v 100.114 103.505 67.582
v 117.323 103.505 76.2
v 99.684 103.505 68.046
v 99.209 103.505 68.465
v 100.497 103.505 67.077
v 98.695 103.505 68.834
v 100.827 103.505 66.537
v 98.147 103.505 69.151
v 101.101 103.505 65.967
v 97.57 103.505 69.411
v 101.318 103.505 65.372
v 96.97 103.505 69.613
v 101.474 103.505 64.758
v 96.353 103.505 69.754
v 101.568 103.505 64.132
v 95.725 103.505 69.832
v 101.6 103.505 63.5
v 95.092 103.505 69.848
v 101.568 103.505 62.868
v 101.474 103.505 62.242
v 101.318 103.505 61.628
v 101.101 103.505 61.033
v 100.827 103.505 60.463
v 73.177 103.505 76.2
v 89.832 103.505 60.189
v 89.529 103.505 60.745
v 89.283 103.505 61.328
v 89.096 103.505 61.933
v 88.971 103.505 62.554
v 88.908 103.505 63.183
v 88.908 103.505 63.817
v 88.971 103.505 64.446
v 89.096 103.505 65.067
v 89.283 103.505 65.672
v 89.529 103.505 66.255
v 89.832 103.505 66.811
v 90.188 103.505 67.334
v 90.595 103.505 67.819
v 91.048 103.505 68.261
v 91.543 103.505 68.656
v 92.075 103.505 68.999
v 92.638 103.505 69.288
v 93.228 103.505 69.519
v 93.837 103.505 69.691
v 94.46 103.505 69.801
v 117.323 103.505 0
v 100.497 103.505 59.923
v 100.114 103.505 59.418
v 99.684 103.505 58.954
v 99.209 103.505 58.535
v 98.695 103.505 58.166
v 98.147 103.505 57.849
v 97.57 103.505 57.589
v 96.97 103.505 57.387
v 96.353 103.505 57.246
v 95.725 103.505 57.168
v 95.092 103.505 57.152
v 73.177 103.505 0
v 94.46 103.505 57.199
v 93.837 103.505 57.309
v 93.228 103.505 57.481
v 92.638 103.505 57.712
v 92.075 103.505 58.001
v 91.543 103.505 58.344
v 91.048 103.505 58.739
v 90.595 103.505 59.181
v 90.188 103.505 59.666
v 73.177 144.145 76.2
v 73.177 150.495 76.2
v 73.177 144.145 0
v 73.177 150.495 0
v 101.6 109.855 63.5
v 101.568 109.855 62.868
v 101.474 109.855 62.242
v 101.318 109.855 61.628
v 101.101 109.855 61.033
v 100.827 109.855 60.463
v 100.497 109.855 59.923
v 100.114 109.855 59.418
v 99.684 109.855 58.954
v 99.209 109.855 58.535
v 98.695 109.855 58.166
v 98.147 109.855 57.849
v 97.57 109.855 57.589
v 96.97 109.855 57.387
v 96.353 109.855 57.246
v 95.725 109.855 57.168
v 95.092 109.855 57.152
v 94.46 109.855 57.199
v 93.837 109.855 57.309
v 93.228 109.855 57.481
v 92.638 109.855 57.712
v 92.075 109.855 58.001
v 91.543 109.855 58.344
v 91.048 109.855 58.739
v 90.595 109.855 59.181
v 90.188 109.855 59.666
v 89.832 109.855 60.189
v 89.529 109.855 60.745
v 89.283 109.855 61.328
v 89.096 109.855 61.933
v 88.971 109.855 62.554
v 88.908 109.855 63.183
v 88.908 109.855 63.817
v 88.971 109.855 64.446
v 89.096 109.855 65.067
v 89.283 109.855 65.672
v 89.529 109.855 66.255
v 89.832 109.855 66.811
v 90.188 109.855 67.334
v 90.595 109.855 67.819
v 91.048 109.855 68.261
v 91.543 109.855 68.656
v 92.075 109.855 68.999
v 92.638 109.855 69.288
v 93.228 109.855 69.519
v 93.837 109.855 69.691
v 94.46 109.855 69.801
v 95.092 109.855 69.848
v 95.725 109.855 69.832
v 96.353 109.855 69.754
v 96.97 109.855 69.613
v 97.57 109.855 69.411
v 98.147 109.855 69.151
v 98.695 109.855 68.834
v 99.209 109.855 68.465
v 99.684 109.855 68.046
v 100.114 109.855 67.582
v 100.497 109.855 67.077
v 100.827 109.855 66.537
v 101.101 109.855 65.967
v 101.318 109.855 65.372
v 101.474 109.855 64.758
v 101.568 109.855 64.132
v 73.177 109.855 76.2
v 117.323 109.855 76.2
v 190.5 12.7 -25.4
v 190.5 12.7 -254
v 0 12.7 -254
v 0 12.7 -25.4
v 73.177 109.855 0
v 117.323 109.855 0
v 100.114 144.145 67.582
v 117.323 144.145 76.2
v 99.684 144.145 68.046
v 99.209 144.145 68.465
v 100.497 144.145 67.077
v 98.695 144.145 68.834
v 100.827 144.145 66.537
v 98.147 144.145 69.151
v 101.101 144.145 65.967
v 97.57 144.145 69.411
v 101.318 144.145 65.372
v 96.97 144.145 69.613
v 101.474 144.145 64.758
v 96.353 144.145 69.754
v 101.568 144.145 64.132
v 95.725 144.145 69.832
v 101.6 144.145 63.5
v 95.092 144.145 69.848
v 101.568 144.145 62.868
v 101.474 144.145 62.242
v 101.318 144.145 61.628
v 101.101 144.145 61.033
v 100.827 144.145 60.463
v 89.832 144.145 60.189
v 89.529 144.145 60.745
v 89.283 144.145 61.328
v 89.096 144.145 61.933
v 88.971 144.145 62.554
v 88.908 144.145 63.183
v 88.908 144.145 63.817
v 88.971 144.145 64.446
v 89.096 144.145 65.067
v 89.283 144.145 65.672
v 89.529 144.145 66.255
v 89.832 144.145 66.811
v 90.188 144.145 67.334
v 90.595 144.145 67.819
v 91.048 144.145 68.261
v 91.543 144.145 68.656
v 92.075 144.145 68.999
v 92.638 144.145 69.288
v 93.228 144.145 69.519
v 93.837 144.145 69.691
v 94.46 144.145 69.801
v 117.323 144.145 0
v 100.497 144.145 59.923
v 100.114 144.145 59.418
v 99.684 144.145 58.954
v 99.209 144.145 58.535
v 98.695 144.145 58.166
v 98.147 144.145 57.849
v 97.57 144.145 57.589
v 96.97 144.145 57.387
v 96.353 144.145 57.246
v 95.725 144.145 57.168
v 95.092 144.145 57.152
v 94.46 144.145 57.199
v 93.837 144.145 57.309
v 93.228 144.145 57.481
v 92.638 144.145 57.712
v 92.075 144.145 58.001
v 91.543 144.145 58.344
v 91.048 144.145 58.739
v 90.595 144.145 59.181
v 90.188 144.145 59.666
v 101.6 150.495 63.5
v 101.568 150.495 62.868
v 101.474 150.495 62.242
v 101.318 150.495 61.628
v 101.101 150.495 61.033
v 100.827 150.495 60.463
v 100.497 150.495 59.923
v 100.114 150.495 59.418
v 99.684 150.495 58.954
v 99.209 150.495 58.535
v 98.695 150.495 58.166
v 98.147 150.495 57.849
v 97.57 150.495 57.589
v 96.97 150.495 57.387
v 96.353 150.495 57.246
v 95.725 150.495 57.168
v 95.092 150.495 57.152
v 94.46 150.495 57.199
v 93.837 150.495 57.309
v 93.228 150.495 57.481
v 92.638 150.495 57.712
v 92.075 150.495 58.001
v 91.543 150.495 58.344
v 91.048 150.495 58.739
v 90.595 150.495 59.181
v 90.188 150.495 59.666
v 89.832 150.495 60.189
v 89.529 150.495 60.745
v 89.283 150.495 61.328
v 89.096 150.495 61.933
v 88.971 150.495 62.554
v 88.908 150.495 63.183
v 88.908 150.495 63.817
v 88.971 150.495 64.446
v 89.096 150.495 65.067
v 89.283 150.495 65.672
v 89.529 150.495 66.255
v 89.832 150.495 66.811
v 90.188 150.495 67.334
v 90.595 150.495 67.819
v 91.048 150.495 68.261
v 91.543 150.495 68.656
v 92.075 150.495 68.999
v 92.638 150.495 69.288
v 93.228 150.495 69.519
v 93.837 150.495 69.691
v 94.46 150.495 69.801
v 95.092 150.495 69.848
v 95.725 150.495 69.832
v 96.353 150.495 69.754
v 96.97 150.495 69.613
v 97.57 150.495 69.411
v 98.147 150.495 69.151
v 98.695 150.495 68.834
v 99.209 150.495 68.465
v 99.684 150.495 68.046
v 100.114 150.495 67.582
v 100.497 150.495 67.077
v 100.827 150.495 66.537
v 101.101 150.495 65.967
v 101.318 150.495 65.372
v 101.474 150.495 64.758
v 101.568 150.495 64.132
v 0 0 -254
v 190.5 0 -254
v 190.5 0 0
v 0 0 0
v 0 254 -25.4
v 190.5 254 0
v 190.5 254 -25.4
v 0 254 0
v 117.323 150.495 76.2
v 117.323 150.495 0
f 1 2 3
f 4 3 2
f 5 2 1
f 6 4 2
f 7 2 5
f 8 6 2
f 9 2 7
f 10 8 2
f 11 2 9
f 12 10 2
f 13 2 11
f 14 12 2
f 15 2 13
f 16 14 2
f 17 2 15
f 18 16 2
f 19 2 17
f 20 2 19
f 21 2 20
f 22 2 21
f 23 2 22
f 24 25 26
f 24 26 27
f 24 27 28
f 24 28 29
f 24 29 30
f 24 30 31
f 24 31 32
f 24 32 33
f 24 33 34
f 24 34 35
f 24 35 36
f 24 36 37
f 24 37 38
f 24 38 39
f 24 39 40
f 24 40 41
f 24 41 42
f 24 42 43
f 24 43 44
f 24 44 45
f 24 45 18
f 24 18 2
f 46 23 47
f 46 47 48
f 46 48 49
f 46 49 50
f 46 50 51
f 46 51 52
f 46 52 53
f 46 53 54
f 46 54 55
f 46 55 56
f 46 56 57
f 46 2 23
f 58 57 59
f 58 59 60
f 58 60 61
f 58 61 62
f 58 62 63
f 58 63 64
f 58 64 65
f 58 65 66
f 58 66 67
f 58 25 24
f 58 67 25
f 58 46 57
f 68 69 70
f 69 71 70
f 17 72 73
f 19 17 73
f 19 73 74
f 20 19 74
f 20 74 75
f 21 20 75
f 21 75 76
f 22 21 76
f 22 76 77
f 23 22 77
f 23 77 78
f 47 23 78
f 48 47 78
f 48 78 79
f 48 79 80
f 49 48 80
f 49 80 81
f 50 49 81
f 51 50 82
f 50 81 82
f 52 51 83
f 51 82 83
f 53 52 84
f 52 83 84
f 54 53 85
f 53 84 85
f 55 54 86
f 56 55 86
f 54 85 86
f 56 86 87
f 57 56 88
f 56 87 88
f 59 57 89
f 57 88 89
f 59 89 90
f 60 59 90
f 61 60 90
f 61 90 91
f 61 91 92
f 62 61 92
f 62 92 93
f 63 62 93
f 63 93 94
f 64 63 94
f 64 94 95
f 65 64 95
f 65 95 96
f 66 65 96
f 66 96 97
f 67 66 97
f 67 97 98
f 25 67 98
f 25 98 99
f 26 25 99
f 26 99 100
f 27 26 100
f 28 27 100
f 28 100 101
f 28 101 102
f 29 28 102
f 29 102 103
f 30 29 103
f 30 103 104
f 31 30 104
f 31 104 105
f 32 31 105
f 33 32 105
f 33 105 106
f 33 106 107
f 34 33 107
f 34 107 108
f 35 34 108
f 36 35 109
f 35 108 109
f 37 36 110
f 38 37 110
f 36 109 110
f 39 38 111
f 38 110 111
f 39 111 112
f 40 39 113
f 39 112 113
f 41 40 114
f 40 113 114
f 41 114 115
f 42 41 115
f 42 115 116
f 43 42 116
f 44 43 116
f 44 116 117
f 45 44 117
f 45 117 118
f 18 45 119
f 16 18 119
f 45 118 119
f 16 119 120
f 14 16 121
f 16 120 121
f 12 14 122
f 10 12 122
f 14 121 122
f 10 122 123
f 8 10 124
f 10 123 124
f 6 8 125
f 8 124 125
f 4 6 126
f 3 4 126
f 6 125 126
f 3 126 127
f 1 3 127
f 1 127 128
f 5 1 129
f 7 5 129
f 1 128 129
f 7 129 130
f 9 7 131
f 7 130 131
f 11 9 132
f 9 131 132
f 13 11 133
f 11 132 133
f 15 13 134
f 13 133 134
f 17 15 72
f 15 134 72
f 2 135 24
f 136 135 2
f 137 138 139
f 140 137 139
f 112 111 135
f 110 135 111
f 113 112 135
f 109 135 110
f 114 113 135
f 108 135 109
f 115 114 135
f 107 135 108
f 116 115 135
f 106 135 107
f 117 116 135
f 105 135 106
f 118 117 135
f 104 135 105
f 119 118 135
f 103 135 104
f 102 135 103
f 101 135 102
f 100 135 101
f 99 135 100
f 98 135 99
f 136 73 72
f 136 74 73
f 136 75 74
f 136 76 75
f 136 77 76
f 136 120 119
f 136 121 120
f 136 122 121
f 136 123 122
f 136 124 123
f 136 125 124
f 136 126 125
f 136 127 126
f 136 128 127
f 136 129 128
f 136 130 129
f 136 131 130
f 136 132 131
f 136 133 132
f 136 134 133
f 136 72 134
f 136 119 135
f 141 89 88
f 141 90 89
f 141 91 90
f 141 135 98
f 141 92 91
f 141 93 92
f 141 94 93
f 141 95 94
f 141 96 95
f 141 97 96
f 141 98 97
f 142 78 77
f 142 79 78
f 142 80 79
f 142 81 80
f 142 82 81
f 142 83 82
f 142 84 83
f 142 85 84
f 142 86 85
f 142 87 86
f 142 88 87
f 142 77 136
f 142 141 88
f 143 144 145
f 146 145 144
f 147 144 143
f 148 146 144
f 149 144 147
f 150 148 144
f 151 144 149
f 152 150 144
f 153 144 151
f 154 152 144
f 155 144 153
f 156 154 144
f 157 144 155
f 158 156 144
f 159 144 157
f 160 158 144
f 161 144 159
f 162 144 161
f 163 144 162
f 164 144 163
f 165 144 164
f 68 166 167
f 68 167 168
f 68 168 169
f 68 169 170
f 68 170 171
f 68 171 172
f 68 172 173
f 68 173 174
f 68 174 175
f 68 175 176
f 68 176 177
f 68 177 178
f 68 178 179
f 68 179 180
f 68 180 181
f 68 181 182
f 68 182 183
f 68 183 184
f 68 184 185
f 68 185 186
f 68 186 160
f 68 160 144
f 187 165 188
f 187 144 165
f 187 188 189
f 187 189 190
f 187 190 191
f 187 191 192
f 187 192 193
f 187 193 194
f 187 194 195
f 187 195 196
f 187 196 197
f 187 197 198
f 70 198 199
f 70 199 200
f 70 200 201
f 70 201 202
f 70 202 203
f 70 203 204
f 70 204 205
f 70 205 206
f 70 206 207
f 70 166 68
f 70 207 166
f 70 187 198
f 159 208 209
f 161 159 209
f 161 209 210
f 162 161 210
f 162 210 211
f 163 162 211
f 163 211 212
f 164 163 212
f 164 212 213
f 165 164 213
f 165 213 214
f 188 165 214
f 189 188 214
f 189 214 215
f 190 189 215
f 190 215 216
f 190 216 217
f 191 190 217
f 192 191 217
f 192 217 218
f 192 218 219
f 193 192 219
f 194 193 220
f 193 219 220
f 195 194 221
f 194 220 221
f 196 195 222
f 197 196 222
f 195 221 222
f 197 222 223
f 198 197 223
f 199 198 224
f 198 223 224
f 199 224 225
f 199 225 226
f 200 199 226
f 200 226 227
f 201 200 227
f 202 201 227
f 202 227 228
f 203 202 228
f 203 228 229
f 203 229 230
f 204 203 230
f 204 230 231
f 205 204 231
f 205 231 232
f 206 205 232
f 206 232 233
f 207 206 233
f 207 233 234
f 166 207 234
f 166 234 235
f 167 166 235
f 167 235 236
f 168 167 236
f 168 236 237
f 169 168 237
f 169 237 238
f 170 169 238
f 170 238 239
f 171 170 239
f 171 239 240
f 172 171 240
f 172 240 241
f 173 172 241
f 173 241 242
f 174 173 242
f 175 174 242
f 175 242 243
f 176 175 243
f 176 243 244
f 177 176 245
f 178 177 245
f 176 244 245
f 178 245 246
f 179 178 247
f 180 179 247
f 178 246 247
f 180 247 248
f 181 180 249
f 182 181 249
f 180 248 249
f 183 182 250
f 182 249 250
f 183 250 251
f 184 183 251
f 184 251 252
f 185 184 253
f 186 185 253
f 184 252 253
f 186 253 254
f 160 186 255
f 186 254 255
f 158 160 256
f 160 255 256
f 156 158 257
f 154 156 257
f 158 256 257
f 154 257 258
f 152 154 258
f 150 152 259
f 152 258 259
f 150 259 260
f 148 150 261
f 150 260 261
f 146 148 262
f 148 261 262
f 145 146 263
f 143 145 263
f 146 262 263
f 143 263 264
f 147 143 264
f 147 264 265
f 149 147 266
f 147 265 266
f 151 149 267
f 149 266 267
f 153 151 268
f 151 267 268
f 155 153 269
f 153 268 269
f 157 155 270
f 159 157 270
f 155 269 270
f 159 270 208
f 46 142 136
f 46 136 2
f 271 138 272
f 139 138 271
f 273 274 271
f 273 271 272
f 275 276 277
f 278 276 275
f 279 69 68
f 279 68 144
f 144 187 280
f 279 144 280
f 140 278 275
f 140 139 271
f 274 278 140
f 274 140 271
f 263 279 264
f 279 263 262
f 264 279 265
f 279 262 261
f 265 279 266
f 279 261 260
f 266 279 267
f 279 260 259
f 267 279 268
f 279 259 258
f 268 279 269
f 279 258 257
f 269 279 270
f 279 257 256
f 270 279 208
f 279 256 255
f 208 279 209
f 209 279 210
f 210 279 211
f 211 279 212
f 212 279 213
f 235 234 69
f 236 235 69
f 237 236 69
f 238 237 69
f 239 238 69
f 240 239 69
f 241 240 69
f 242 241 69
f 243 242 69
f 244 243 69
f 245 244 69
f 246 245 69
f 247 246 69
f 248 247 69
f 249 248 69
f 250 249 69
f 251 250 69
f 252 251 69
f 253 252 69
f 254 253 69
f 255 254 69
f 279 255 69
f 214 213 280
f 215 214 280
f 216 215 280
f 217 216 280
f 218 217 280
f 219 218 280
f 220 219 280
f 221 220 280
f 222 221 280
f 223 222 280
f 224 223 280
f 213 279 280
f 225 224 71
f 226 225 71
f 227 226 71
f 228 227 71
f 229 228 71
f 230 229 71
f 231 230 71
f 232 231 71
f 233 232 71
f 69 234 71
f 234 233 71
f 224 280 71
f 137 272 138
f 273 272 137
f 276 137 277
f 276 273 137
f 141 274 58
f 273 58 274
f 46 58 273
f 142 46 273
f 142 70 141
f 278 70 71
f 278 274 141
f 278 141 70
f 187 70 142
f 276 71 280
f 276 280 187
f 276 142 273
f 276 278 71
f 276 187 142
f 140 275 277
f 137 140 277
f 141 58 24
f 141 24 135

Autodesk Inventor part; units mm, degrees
ref_plane "YZ Plane" through (0, 0, 0) normal (1, 0, 0) x (0, 1, 0)
ref_plane "XZ Plane" through (0, 0, 0) normal (0, 1, 0) x (-1, 0, 0)
ref_plane "XY Plane" through (0, 0, 0) normal (0, 0, 1) x (1, 0, 0)
sketch "Sketch1" plane through (0, 0, 0) normal (0, 0, 1) x (1, 0, 0)
  line L0 (0, 0) -> (190.5, 0)
  line L1 (190.5, 0) -> (190.5, 254)
  line L2 (190.5, 254) -> (0, 254)
  line L3 (0, 254) -> (0, 0)
  dimension "d0" = 190.5
  dimension "d1" = 254
extrude "Extrusion1" add sketch "Sketch1" against normal blind 25.4
sketch "Sketch2" plane through (0, 0, 0) normal (0, 0, 1) x (1, 0, 0)
  line L0 (0, 0) -> (0, 254) projected
  line L1 (0, 127) -> (190.5, 127)
  line L2 (190.5, 254) -> (190.5, 0) projected
  line L3 (54.1274, 112.395) -> (54.1274, 106.045)
  line L4 (95.25, 144.145) -> (117.3226, 144.145)
  line L5 (117.3226, 144.145) -> (73.1774, 144.145)
  line L6 (95.25, 109.855) -> (117.3226, 109.855)
  line L7 (117.3226, 109.855) -> (73.1774, 109.855)
  line L8 (73.1774, 144.145) -> (117.3226, 144.145)
  line L9 (117.3226, 144.145) -> (117.3226, 150.495)
  line L10 (117.3226, 150.495) -> (73.1774, 150.495)
  line L11 (73.1774, 150.495) -> (73.1774, 144.145)
  line L12 (73.1774, 109.855) -> (117.3226, 109.855)
  line L13 (117.3226, 109.855) -> (117.3226, 103.505)
  line L14 (117.3226, 103.505) -> (73.1774, 103.505)
  line L15 (73.1774, 103.505) -> (73.1774, 109.855)
  point P0 (54.1274, 141.605)
  dimension "d16" = 22.0726
  dimension "d17" = 44.1452
  dimension "d18" = 6.35
  dimension "d19" = 6.35
extrude "Extrusion2" add sketch "Sketch2" along normal blind 76.2
sketch "Sketch3" plane through (54.1274, 112.395, 0) normal (0, 1, 0) x (1, 0, 0)
  circle A0 centre (22.0726, -63.5) radius 6.35
  point P0 (-54.1274, 0)
  dimension "d10" = 12.7
extrude "Extrusion3" [suppressed]
sketch "Sketch4" plane through (0, 0, -25.4) normal (0, 0, -1) x (-1, 0, 0)
  line L0 (-190.5, 0) -> (-190.5, 254) projected
  line L1 (0, 0) -> (-190.5, 0)
  line L2 (-190.5, 0) -> (-190.5, 12.7)
  line L3 (-190.5, 12.7) -> (0, 12.7)
  line L4 (0, 12.7) -> (0, 0)
  dimension "d13" = 12.7
extrude "Extrusion4" add sketch "Sketch4" along normal blind 228.6
sketch "Sketch5" plane through (73.1774, 150.495, 0) normal (0, 1, 0) x (1, 0, 0)
  circle A0 centre (22.0726, -63.5) radius 6.35
  point P0 (-73.1774, 0)
  dimension "d20" = 12.7
extrude "Extrusion5" cut sketch "Sketch5" against normal blind 101.6
properties part number "LucasCharles Part3" material "ABS Plastic"
